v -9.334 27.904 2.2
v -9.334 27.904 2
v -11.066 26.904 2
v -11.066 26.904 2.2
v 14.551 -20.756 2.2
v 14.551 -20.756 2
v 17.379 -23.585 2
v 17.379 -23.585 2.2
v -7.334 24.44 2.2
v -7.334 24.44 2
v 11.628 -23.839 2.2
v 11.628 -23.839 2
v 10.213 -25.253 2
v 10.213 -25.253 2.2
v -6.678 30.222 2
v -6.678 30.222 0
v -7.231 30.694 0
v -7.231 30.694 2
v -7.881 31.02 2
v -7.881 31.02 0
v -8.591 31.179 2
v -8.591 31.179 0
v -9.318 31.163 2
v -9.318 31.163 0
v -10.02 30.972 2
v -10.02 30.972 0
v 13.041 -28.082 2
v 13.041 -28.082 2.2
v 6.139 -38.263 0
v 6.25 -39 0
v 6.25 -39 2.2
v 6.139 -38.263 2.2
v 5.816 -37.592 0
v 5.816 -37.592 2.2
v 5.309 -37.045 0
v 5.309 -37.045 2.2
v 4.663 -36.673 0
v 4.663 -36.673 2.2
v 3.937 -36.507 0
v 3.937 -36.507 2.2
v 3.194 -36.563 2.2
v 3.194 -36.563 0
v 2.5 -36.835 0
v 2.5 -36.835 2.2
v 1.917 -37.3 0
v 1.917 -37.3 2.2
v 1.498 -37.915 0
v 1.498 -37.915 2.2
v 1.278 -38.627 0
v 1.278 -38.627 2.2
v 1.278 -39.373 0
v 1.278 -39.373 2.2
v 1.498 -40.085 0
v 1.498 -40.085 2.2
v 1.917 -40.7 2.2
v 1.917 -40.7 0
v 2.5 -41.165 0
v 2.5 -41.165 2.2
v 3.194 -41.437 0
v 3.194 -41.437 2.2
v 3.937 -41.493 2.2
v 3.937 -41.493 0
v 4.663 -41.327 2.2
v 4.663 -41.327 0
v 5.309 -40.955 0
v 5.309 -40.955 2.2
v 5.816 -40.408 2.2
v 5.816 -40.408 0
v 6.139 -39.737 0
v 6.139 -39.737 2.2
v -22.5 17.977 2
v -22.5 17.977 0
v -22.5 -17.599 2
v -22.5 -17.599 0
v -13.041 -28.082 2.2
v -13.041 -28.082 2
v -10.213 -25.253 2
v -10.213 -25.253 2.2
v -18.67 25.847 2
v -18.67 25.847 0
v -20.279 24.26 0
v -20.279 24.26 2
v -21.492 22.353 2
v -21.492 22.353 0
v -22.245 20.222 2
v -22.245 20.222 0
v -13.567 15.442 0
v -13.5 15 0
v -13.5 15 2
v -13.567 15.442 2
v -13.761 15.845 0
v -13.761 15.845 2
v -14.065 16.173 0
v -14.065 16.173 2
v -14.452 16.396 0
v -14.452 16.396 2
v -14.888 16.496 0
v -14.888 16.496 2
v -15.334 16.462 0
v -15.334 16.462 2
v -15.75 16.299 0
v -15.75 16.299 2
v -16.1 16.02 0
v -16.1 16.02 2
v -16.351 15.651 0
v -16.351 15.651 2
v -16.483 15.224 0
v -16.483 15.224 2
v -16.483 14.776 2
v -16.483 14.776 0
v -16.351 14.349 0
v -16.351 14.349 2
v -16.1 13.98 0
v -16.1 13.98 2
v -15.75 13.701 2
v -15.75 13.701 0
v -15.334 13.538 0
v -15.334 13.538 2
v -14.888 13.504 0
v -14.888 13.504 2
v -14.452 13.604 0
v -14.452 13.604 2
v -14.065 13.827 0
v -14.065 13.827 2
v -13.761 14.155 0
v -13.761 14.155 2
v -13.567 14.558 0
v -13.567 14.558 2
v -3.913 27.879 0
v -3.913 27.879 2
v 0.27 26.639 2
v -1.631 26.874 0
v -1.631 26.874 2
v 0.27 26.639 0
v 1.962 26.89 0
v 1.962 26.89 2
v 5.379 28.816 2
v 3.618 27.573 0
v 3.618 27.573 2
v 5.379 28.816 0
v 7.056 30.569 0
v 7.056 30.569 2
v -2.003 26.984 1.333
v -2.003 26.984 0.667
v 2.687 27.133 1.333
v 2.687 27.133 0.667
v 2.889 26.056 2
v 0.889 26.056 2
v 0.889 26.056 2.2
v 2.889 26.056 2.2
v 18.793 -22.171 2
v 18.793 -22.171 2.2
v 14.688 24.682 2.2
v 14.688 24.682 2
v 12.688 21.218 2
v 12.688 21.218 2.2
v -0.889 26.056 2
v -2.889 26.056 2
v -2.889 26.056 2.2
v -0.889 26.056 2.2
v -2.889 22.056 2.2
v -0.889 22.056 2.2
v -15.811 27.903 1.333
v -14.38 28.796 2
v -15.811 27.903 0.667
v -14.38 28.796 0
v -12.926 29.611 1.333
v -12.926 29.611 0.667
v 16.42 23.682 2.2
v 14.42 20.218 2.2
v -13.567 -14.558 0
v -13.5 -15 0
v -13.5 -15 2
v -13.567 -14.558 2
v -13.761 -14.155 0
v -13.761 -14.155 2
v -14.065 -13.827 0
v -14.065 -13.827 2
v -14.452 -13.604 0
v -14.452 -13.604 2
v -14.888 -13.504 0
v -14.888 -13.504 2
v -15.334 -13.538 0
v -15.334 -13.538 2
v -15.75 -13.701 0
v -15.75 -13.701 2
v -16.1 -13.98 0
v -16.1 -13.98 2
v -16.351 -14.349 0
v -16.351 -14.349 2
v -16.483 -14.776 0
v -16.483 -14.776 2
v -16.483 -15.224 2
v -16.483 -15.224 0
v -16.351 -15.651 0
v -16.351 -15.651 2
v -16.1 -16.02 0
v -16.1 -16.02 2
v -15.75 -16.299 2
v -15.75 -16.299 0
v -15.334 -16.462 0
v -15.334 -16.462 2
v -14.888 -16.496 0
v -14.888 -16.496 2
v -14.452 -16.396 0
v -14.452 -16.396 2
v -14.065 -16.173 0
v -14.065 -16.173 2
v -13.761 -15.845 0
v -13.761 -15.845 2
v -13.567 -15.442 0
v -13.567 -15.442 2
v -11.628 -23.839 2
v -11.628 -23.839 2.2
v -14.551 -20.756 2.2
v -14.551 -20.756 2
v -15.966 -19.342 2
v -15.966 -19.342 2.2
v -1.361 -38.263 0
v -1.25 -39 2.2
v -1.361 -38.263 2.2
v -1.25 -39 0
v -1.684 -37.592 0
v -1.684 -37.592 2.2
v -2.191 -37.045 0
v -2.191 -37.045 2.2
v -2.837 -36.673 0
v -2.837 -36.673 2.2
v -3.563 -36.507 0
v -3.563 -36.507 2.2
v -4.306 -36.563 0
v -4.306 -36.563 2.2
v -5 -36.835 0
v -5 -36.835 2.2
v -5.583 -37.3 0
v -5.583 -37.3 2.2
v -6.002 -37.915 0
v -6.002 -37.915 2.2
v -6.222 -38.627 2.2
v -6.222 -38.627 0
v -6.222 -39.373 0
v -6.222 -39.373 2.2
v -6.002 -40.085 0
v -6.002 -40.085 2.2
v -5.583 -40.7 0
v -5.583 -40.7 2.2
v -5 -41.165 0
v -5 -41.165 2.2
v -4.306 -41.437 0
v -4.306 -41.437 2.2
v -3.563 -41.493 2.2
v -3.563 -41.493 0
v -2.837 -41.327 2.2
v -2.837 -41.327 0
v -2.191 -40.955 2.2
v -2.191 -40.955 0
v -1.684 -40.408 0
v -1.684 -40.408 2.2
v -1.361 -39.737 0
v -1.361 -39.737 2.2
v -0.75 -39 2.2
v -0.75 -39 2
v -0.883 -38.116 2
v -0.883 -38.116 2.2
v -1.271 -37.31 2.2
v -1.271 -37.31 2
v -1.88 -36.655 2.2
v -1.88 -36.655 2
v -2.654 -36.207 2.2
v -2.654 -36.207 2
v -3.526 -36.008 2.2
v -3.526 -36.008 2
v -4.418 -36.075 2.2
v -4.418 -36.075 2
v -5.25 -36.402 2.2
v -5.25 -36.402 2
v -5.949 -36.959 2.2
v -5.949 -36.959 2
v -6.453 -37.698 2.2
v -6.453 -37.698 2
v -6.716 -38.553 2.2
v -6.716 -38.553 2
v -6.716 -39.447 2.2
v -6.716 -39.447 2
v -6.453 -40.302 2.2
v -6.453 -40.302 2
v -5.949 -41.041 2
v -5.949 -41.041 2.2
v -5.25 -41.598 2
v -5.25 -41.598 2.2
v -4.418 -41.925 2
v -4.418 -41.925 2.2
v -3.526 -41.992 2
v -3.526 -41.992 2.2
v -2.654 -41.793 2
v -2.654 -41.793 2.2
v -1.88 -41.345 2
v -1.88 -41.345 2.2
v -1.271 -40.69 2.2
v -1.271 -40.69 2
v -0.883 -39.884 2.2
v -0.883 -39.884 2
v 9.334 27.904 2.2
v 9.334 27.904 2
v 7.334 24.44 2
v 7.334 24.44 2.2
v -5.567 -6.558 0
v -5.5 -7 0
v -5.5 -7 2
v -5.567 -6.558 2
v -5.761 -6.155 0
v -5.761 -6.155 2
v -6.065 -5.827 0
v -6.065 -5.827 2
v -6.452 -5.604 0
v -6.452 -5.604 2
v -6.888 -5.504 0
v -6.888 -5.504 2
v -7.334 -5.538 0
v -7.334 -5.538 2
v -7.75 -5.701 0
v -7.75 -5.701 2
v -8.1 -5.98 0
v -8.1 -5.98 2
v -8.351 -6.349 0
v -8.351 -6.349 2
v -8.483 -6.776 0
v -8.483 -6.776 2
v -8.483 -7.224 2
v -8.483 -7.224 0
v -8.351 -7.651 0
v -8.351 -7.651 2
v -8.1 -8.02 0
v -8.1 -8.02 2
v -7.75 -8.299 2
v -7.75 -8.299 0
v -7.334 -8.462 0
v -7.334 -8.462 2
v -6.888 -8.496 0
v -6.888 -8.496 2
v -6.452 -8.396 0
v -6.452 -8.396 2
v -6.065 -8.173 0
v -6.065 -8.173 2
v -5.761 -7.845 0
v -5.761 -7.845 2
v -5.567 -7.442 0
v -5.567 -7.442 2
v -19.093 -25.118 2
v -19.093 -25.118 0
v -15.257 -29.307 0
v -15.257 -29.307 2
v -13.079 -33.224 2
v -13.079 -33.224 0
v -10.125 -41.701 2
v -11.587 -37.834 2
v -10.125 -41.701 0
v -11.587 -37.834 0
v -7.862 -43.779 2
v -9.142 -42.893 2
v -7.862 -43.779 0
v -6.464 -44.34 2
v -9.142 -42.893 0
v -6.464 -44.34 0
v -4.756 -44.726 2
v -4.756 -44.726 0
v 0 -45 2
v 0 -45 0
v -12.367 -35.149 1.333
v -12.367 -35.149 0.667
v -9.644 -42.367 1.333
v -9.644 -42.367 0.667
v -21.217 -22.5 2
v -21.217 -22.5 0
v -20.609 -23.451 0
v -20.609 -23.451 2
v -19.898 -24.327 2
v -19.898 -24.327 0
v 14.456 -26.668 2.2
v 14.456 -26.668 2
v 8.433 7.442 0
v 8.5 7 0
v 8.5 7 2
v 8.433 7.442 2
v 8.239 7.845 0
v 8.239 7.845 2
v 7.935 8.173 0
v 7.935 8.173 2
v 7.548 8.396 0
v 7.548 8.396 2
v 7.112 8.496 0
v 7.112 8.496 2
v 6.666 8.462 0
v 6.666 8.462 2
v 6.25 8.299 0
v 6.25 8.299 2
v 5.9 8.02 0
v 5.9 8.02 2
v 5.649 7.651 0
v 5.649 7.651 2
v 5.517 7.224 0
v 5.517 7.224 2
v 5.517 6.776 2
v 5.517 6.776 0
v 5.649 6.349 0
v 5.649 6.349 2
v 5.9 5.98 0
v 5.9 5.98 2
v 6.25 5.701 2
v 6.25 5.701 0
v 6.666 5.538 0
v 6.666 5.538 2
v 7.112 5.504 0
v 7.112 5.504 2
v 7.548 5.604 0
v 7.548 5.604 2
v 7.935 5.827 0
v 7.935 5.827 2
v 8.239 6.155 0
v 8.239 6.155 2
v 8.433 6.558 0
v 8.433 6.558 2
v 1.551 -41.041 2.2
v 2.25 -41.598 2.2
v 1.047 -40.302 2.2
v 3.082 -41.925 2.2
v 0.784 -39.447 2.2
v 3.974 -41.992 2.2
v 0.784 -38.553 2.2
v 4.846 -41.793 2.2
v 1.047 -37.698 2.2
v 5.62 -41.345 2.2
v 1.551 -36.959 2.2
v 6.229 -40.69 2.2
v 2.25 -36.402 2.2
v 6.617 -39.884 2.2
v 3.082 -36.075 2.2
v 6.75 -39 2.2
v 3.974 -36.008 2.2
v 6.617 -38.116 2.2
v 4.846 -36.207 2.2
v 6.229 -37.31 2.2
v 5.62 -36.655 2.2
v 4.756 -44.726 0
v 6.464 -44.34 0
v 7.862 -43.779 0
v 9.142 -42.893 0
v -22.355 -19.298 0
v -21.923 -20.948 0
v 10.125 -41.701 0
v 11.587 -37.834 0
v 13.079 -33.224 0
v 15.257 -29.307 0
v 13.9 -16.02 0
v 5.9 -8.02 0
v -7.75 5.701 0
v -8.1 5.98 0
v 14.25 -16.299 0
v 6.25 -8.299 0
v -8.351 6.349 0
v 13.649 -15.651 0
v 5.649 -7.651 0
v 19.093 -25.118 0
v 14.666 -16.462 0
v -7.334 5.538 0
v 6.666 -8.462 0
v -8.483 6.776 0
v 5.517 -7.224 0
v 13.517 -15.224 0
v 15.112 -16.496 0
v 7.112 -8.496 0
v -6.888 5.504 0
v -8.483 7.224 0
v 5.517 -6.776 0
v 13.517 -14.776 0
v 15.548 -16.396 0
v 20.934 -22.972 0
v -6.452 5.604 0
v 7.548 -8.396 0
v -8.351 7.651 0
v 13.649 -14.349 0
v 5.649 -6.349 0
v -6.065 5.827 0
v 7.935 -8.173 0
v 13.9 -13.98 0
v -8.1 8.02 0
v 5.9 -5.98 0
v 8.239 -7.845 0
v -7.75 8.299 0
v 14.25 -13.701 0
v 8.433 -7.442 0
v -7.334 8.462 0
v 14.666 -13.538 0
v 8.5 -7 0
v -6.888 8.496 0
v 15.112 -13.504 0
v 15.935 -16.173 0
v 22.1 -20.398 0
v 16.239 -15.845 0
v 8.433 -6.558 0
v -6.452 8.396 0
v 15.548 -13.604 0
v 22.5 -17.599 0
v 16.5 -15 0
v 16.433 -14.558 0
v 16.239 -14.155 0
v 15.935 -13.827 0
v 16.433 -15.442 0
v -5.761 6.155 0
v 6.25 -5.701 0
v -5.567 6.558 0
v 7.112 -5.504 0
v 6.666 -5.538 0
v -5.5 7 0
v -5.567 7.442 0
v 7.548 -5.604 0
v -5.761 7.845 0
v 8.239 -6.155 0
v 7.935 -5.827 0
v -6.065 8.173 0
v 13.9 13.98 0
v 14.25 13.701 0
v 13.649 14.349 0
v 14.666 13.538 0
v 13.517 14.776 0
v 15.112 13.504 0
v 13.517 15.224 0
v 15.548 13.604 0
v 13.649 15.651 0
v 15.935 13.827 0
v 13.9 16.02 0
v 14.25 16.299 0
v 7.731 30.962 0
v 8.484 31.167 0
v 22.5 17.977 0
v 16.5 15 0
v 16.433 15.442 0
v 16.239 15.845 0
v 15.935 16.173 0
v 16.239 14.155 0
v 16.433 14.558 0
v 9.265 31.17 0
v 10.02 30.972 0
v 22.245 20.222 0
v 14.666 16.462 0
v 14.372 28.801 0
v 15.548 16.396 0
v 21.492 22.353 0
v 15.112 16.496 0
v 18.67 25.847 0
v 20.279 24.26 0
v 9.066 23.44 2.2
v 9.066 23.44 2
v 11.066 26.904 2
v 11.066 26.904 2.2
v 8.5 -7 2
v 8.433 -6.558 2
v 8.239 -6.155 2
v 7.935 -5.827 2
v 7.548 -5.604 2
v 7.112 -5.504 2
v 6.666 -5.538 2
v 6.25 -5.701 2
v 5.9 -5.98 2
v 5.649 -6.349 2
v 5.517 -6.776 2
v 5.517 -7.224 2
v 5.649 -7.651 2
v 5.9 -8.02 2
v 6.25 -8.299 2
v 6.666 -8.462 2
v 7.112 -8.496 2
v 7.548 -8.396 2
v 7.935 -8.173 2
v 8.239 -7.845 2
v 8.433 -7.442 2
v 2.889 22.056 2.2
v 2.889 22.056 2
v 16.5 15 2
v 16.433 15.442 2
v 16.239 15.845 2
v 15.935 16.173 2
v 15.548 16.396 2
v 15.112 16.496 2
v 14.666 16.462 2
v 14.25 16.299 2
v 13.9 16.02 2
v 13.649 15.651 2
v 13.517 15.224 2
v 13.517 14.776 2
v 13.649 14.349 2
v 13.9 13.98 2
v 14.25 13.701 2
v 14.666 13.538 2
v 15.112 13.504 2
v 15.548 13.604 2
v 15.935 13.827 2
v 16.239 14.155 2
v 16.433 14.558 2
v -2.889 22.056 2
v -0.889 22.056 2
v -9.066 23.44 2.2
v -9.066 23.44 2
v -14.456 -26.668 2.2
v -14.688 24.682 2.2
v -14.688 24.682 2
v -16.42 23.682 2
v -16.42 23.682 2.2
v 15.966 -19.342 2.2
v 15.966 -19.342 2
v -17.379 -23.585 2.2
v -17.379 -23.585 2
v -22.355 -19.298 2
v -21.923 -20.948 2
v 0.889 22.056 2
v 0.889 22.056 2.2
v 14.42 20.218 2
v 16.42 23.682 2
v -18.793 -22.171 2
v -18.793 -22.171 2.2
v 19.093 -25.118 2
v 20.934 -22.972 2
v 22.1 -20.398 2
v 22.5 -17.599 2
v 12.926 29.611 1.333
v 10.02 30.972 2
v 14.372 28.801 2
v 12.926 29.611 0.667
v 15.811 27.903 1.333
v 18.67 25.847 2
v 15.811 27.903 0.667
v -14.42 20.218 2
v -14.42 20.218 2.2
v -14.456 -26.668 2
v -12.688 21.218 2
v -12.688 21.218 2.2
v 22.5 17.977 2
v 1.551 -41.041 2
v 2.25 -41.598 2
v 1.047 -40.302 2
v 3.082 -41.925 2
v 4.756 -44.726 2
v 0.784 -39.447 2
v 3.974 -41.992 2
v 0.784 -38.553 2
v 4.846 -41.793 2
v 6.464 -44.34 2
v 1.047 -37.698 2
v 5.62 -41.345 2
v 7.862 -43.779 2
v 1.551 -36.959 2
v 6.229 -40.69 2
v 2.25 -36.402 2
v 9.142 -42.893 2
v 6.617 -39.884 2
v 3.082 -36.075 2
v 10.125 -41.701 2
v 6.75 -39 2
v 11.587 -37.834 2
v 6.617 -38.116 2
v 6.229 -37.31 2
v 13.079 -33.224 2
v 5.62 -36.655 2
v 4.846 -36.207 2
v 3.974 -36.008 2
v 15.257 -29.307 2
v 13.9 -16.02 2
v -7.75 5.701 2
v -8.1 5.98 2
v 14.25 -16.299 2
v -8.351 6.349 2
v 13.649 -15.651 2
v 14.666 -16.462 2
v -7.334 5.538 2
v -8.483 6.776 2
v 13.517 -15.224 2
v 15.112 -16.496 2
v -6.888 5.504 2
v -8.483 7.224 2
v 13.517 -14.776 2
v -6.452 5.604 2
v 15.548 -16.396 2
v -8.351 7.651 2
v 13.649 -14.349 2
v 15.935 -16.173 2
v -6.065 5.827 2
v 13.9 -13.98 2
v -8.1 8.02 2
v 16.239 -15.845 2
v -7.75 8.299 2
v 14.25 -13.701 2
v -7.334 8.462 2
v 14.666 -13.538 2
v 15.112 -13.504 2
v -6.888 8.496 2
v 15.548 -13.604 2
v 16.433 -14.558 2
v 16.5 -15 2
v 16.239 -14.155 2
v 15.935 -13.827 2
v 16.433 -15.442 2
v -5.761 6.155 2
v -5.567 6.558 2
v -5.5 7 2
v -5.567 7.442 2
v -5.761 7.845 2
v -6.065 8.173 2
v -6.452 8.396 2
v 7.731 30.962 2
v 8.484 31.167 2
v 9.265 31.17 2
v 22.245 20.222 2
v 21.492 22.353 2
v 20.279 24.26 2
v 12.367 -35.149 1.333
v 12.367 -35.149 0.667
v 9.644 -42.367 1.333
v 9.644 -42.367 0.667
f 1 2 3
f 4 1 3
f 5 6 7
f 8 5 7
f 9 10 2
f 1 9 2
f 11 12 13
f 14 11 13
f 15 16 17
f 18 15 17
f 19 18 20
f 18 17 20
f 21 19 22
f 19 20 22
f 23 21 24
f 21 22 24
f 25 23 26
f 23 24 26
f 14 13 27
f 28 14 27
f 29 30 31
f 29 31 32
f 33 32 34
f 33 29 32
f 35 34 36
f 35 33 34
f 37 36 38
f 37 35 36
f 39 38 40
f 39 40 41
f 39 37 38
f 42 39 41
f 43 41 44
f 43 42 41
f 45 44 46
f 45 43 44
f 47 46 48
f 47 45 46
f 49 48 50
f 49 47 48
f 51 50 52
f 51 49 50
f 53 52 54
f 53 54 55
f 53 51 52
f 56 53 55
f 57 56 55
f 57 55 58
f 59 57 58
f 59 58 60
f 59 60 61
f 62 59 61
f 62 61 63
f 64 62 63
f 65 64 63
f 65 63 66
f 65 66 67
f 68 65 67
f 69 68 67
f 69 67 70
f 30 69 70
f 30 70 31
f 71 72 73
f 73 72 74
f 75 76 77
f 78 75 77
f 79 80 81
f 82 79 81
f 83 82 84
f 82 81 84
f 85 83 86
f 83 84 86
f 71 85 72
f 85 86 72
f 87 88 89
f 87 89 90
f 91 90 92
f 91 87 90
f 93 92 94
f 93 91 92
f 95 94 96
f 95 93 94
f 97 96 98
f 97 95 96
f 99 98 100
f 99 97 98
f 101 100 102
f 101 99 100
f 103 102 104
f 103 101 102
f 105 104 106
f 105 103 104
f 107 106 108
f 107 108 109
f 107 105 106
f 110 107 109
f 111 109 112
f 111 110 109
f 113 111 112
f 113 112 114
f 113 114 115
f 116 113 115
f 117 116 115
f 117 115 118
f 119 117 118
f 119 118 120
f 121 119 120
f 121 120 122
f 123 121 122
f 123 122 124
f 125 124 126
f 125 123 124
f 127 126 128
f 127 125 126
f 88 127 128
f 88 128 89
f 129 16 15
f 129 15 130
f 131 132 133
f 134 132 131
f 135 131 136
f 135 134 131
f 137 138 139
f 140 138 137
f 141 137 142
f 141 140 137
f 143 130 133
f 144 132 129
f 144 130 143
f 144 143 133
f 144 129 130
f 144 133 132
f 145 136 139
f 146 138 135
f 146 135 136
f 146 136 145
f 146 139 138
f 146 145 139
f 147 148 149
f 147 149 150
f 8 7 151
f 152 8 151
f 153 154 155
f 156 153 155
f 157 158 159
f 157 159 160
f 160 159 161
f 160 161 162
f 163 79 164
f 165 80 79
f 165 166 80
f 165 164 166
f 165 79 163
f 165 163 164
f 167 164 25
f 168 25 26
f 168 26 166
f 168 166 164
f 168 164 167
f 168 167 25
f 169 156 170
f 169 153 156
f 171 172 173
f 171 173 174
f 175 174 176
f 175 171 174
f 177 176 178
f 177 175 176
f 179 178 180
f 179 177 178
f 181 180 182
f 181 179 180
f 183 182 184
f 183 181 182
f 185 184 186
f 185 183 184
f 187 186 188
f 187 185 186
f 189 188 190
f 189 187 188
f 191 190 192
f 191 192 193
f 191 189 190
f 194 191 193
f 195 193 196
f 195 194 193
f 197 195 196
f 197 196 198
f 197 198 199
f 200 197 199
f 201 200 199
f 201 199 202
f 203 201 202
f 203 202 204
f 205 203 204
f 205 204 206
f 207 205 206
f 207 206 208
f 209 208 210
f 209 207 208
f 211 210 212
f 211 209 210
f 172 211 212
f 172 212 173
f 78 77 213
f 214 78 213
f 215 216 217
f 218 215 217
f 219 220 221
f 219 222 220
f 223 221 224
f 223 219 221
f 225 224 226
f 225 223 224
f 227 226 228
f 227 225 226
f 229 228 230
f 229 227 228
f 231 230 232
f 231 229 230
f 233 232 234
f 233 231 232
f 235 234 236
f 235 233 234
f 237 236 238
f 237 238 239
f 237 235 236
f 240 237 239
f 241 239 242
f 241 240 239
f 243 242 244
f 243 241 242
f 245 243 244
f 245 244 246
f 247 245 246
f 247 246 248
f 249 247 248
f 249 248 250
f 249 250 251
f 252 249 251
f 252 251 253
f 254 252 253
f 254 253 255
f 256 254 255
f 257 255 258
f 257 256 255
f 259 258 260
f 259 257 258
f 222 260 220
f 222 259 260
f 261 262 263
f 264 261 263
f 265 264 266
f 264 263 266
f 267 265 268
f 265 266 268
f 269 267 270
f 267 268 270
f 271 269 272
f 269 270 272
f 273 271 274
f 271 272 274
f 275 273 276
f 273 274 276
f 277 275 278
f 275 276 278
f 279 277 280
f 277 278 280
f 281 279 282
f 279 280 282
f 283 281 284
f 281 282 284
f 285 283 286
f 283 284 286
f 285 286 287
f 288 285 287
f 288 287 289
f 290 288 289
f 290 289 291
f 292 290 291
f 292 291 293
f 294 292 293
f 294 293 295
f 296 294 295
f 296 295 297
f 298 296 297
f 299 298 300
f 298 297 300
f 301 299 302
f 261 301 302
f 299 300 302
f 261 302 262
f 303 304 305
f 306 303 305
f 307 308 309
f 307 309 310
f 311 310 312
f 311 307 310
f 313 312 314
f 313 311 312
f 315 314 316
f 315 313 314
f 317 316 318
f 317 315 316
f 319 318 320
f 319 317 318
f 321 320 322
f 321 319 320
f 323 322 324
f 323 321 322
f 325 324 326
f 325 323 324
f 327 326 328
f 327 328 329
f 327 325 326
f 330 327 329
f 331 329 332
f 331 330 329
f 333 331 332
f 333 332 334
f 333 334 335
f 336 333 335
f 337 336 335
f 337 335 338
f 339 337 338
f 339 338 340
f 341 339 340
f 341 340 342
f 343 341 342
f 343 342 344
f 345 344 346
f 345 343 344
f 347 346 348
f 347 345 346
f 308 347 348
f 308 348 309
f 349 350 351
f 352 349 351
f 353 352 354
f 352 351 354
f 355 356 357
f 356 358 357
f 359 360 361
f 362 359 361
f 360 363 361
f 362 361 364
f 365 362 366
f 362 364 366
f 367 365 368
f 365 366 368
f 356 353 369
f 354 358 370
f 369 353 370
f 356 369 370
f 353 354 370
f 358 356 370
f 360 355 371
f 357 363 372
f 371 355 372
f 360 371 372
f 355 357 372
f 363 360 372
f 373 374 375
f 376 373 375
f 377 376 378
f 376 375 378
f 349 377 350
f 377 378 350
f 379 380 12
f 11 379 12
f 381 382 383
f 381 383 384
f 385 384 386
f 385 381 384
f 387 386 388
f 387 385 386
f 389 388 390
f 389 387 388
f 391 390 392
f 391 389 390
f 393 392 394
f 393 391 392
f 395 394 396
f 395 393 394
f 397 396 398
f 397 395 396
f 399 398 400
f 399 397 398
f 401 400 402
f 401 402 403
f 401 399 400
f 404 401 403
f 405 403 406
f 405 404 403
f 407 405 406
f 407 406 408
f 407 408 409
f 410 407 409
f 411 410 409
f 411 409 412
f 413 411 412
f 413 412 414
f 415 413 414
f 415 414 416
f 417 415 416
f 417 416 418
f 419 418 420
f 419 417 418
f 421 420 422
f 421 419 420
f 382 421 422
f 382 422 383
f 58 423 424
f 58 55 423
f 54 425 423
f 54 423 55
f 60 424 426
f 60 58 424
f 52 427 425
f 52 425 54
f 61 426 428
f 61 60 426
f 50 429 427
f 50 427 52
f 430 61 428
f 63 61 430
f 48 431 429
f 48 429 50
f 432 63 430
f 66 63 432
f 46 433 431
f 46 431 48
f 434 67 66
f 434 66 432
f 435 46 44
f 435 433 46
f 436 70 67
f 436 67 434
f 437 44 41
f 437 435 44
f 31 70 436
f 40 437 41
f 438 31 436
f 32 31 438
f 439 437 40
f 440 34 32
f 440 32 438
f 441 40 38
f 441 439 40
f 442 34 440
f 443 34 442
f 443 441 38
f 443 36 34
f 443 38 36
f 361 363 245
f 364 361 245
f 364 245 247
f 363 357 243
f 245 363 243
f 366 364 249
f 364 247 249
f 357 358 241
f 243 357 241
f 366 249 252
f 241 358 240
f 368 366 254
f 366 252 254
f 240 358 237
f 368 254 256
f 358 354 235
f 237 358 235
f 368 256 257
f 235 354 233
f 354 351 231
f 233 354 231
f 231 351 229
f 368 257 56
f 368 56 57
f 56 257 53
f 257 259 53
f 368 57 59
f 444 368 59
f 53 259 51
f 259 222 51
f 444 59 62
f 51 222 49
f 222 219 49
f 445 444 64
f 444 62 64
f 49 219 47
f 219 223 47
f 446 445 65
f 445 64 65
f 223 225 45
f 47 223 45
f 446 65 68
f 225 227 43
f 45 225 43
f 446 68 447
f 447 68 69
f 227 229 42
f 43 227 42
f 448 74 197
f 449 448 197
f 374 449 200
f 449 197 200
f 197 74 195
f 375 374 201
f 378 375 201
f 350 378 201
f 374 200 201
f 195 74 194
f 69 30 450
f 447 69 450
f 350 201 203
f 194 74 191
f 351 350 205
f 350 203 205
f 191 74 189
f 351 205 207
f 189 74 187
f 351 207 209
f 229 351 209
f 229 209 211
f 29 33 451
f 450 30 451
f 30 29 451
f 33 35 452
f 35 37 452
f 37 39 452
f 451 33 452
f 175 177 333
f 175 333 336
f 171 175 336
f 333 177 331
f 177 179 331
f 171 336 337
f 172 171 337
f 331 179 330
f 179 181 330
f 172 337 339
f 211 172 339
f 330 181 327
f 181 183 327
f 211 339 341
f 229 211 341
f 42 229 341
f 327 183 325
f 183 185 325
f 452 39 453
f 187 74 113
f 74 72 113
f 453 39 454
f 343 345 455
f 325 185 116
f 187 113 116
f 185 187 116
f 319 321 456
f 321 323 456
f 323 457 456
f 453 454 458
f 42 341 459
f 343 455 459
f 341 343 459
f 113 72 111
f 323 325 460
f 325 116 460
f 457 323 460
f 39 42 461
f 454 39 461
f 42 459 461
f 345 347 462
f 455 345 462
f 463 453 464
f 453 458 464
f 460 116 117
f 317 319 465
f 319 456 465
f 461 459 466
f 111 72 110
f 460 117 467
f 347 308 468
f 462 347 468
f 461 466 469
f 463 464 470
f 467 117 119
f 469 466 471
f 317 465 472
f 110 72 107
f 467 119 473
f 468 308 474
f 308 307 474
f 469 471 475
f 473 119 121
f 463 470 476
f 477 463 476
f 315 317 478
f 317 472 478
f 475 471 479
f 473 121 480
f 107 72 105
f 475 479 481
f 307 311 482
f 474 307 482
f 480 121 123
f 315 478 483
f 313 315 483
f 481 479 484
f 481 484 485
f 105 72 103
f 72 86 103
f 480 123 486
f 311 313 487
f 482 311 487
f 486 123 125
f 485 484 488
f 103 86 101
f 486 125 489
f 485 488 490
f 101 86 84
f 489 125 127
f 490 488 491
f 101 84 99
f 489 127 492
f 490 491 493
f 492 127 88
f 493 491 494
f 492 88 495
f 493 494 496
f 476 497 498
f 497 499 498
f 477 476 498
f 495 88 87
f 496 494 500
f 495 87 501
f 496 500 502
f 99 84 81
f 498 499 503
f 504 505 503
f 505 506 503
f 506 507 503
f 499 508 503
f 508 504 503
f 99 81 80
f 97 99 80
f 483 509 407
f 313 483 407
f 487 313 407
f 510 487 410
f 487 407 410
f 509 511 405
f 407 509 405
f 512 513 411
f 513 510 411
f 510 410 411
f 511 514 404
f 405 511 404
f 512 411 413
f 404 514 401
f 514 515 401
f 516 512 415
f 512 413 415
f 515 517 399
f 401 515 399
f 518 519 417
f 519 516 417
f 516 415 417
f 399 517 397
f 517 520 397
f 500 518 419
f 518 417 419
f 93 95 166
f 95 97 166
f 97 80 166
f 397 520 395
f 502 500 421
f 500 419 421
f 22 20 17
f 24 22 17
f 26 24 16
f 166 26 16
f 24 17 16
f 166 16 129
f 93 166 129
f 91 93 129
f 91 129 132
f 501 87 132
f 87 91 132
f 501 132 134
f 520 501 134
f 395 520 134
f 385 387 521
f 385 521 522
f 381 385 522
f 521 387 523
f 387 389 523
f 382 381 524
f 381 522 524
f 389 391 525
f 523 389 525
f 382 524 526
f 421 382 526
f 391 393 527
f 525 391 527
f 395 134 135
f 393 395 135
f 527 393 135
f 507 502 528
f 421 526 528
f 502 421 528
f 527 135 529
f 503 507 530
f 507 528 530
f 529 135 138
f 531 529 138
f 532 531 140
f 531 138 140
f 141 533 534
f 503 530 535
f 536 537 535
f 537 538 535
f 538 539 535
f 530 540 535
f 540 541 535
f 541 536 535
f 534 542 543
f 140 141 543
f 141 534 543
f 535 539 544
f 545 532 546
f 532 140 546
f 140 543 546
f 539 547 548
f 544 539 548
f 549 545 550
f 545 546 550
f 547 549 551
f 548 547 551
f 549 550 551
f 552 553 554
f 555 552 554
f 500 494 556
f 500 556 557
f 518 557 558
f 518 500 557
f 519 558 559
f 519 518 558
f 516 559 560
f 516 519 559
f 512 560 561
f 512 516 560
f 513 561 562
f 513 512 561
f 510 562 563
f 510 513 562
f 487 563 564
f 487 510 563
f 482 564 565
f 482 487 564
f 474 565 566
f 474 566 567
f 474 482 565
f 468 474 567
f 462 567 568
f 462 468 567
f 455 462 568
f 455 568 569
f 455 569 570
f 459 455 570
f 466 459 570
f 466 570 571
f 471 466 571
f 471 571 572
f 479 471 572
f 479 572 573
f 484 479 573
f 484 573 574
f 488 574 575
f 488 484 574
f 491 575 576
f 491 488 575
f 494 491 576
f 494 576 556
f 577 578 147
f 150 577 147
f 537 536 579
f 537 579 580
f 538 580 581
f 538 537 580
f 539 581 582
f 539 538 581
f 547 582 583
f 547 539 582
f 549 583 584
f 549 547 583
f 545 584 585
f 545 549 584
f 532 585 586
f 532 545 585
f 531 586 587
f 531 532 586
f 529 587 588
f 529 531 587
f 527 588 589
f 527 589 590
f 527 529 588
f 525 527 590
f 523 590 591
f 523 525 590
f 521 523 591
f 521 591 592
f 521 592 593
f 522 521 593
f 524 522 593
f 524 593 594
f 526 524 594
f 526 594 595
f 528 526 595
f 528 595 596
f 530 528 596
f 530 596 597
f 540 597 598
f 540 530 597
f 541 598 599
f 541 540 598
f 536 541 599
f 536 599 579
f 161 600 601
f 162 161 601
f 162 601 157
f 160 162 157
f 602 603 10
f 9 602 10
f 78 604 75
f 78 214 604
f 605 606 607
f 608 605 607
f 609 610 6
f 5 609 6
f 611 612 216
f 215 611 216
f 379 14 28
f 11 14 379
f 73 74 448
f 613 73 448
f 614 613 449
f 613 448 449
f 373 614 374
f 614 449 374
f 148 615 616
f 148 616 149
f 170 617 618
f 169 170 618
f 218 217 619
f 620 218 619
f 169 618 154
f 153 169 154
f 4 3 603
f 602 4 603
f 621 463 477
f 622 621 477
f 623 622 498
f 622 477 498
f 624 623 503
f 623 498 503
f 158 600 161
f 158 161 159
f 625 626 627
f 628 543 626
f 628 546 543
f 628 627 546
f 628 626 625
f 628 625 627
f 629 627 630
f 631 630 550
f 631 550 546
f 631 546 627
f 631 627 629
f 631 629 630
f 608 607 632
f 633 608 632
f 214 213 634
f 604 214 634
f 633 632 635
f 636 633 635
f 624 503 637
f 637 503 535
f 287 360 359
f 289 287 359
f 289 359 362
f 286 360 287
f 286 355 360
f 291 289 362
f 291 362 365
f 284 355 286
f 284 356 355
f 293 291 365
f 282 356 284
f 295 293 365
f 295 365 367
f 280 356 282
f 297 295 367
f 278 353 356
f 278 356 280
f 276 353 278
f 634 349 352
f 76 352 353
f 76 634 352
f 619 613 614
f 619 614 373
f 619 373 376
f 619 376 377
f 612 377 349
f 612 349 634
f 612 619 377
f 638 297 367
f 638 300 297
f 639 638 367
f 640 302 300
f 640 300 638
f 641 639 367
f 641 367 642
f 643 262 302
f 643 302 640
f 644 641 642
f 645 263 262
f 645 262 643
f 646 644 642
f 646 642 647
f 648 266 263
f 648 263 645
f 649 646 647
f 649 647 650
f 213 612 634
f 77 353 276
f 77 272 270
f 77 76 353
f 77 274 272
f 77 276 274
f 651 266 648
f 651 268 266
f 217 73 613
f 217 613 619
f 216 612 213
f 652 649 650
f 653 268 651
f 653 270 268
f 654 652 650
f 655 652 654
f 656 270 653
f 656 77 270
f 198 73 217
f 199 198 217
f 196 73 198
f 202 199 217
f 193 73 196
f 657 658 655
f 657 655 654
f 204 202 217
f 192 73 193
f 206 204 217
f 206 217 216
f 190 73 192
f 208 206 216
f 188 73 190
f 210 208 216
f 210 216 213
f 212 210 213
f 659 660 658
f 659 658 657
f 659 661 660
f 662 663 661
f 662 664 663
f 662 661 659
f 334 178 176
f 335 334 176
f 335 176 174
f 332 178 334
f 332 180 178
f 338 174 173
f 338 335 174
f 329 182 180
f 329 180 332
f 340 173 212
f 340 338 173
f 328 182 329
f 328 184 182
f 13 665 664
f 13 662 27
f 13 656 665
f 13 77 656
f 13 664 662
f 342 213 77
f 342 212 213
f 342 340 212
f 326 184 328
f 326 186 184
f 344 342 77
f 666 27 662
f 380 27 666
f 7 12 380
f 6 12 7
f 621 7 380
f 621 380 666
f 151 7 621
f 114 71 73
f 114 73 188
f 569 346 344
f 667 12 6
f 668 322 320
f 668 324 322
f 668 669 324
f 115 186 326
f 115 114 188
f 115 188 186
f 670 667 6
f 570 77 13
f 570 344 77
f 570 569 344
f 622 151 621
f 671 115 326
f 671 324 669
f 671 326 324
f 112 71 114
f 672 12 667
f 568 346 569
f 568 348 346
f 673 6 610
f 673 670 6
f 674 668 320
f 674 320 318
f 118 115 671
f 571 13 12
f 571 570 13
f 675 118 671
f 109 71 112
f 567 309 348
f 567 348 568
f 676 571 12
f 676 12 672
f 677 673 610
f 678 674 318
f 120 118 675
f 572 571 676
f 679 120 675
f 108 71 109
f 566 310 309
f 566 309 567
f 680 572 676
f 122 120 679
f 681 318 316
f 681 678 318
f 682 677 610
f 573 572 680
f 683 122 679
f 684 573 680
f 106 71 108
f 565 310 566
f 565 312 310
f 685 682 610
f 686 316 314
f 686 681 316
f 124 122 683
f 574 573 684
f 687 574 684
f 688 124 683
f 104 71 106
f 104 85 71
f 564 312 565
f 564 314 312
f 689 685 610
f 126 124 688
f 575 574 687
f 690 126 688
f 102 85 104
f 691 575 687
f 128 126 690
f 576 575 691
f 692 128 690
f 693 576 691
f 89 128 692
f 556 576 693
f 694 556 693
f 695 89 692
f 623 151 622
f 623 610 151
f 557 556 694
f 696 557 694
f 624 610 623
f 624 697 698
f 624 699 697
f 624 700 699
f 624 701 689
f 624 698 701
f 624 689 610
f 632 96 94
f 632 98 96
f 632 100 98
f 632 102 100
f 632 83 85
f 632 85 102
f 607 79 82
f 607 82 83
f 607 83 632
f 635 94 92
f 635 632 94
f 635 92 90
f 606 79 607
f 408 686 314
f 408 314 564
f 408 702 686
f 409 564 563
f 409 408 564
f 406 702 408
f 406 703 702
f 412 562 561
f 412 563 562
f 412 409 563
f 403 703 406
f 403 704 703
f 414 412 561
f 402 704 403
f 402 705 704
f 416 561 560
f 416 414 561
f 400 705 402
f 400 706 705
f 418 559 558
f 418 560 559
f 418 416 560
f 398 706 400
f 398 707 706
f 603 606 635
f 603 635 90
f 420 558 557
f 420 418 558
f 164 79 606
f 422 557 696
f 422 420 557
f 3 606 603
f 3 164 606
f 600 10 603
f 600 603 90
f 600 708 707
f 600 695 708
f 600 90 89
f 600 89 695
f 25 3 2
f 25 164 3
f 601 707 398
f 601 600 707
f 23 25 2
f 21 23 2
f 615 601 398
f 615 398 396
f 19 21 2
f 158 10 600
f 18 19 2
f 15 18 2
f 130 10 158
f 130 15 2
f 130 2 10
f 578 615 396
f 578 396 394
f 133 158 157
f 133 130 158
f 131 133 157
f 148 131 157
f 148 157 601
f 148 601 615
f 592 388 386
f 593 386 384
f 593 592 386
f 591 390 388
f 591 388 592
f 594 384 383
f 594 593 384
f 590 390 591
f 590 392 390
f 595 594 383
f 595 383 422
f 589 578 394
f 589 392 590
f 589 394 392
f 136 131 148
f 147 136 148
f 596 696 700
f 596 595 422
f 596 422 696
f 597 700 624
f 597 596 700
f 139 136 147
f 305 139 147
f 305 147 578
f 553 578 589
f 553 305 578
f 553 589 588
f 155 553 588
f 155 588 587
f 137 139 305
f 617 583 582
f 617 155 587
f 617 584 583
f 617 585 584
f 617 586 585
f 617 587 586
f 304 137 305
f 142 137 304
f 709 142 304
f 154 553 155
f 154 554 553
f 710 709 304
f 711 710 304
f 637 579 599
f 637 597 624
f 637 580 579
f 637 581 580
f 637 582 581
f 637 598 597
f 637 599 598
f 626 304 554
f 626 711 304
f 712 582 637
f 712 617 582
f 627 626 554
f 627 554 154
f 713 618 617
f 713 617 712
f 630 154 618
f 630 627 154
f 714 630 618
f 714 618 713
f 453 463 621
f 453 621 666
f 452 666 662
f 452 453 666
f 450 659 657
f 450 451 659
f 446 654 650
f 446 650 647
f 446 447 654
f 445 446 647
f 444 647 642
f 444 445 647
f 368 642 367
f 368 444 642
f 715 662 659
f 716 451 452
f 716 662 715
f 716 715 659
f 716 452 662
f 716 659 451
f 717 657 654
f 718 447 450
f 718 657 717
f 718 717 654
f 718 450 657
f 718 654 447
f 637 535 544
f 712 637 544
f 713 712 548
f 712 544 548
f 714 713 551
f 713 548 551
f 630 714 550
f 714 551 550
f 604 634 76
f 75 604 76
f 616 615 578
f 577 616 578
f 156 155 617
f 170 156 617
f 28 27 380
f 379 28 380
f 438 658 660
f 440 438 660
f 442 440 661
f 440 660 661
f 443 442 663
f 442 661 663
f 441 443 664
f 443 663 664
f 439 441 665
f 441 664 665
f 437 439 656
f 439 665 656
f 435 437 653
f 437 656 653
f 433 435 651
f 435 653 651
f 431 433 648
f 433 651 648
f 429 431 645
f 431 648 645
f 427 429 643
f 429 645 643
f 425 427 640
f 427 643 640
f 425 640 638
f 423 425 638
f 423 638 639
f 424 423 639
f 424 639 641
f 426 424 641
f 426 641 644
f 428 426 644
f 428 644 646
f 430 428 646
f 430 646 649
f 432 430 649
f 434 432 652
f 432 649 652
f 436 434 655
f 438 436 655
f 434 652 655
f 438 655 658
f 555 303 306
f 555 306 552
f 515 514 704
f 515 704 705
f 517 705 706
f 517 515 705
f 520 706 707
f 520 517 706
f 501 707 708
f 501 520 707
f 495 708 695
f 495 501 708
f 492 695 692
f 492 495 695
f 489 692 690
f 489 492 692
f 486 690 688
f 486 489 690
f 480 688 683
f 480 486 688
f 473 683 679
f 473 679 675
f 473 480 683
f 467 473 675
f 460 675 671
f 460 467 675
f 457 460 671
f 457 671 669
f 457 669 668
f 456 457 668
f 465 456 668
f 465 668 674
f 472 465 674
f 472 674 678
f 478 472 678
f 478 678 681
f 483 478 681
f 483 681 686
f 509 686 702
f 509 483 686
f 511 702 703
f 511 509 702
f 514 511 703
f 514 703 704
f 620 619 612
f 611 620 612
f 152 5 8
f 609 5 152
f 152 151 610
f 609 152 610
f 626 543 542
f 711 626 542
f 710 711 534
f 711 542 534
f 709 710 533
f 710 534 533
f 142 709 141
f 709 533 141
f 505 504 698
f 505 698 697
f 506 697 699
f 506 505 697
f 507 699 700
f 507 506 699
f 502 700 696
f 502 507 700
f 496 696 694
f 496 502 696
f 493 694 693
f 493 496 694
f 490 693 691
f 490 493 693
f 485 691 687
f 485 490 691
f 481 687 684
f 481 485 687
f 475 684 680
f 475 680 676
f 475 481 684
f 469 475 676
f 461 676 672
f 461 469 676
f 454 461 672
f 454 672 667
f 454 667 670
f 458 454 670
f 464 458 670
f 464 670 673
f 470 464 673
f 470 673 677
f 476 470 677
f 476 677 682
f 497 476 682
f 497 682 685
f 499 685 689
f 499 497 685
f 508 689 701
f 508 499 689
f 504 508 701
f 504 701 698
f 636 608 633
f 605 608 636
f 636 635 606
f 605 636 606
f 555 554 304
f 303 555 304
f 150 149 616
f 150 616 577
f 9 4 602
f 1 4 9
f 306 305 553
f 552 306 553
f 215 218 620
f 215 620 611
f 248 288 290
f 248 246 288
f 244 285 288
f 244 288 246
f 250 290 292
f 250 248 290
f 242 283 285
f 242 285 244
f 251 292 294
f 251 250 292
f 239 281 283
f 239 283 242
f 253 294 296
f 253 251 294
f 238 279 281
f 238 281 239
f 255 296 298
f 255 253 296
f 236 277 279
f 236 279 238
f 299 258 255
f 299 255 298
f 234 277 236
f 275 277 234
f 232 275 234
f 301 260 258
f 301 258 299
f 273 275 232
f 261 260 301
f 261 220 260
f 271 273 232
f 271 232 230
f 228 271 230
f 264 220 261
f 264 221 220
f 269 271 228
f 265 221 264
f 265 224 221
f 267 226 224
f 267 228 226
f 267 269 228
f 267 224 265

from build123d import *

# Parameters (mm, degrees)
F0_R     = 2.5
F0_R_2   = 1.5
F1_DEPTH = 2
F2_W     = 2
F2_H     = 4
F2_R     = 3
F2_R_2   = 2.5
F3_DEPTH = 0.2


with BuildPart() as f1:
    # F0 (on Top) → F1 (new body)
    with BuildSketch(Plane.XY):
        with BuildLine():
            Line((22.5, -17.5992111466), (22.5, 17.9769920821))
            ThreePointArc((22.5, 17.9769920821), (21.4916275861, 22.3531357443), (18.6698733295, 25.8467228969))
            add(Edge.make_bspline(
                [(10.0202101022, 30.9724353404), (12.9351645554, 29.7852274215), (15.8255721427, 28.076656607), (18.6698733295, 25.8467228969)],
                knots=[32.3872433875, 32.3872433875, 32.3872433875, 32.3872433875, 41.0712182165, 41.0712182165, 41.0712182165, 41.0712182165], degree=3))
            ThreePointArc((10.0202101022, 30.9724353404), (8.4843597996, 31.1666740134), (7.0561575797, 30.569343926))
            add(Edge.make_bspline(
                [(-6.6778963244, 30.2220172158), (-2.1223269725, 25.2559450952), (2.9587594632, 25.5243336352), (7.0561575797, 30.569343926)],
                knots=[1.2111660498, 1.2111660498, 1.2111660498, 1.2111660498, 14.8998546864, 14.8998546864, 14.8998546864, 14.8998546864], degree=3))
            ThreePointArc((-6.6778963244, 30.2220172158), (-8.2314180106, 31.1211658606), (-10.0202101022, 30.9724353404))
            add(Edge.make_bspline(
                [(-18.6698733295, 25.8467228969), (-15.8255721427, 28.076656607), (-12.9351645554, 29.7852274215), (-10.0202101022, 30.9724353404)],
                knots=[3.9287817835, 3.9287817835, 3.9287817835, 3.9287817835, 12.6127566125, 12.6127566125, 12.6127566125, 12.6127566125], degree=3))
            ThreePointArc((-18.6698733295, 25.8467228969), (-21.4916275861, 22.3531357443), (-22.5, 17.9769920821))
            Line((-22.5, 17.9769920821), (-22.5, -17.5992111466))
            ThreePointArc((-22.5, -17.5992111466), (-22.1738774189, -20.1322124661), (-21.216780863, -22.5))
            ThreePointArc((-21.216780863, -22.5), (-20.2661626921, -23.8989505888), (-19.0933749805, -25.1176821592))
            add(Edge.make_bspline(
                [(-19.0933749805, -25.1176821592), (-6.7235541682, -35.9654817875), (-16.745618261, -45.2509330365), (0, -45)],
                knots=[2.3473845635, 2.3473845635, 2.3473845635, 2.3473845635, 31.8198051534, 31.8198051534, 31.8198051534, 31.8198051534], degree=3))
            add(Edge.make_bspline(
                [(19.0933749805, -25.1176821592), (6.7235541682, -35.9654817875), (16.745618261, -45.2509330365), (0, -45)],
                knots=[2.3473845635, 2.3473845635, 2.3473845635, 2.3473845635, 31.8198051534, 31.8198051534, 31.8198051534, 31.8198051534], degree=3))
            ThreePointArc((19.0933749805, -25.1176821592), (21.6086154218, -21.7263318254), (22.5, -17.5992111466))
        make_face()
        with Locations((-3.75, -39)):
            Circle(F0_R, mode=Mode.SUBTRACT)
        with Locations((-15, -15)):
            Circle(F0_R_2, mode=Mode.SUBTRACT)
        with Locations((-7, -7)):
            Circle(F0_R_2, mode=Mode.SUBTRACT)
        with Locations((3.75, -39)):
            Circle(F0_R, mode=Mode.SUBTRACT)
        with Locations((7, -7)):
            Circle(F0_R_2, mode=Mode.SUBTRACT)
        with Locations((15, -15)):
            Circle(F0_R_2, mode=Mode.SUBTRACT)
        with Locations((-7, 7)):
            Circle(F0_R_2, mode=Mode.SUBTRACT)
        with Locations((-15, 15)):
            Circle(F0_R_2, mode=Mode.SUBTRACT)
        with Locations((7, 7)):
            Circle(F0_R_2, mode=Mode.SUBTRACT)
        with Locations((15, 15)):
            Circle(F0_R_2, mode=Mode.SUBTRACT)
    extrude(amount=F1_DEPTH)

    # F2 (on face) → F3 (join)
    with BuildSketch(Plane.XY.offset(2)):
        Polygon((-16.4196526402, 23.6817868025), (-14.4196526402, 20.2176851873), (-12.6876018326, 21.2176851873), (-14.6876018326, 24.6817868025), align=None)
        Polygon((-11.0663396811, 26.9043505312), (-9.0663396811, 23.4402489161), (-7.3342888736, 24.4402489161), (-9.3342888736, 27.9043505312), align=None)
        with Locations((-1.8889066383, 24.0563029559)):
            Rectangle(F2_W, F2_H)
        with Locations((1.8889066383, 24.0563029559)):
            Rectangle(F2_W, F2_H)
        Polygon((9.3342888736, 27.9043505312), (7.3342888736, 24.4402489161), (9.0663396811, 23.4402489161), (11.0663396811, 26.9043505312), align=None)
        Polygon((12.6876018326, 21.2176851873), (14.4196526402, 20.2176851873), (16.4196526402, 23.6817868025), (14.6876018326, 24.6817868025), align=None)
        Polygon((-17.3788340109, -23.5849192398), (-14.5510007349, -20.755898391), (-15.9655111593, -19.341981753), (-18.7933444353, -22.1710026018), align=None)
        Polygon((-14.4555578038, -26.6683889275), (-13.0410473794, -28.0823055655), (-10.2132141034, -25.2532847167), (-11.6277245278, -23.8393680786), align=None)
        Polygon((10.2132141034, -25.2532847167), (13.0410473794, -28.0823055655), (14.4555578038, -26.6683889275), (11.6277245278, -23.8393680786), align=None)
        Polygon((14.5510007349, -20.755898391), (17.3788340109, -23.5849192398), (18.7933444353, -22.1710026018), (15.9655111593, -19.341981753), align=None)
        with Locations((-3.75, -39)):
            Circle(F2_R)
        with Locations((-3.75, -39)):
            Circle(F2_R_2, mode=Mode.SUBTRACT)
        with Locations((3.75, -39)):
            Circle(F2_R)
        with Locations((3.75, -39)):
            Circle(F2_R_2, mode=Mode.SUBTRACT)
    extrude(amount=F3_DEPTH)


solid = f1.part
